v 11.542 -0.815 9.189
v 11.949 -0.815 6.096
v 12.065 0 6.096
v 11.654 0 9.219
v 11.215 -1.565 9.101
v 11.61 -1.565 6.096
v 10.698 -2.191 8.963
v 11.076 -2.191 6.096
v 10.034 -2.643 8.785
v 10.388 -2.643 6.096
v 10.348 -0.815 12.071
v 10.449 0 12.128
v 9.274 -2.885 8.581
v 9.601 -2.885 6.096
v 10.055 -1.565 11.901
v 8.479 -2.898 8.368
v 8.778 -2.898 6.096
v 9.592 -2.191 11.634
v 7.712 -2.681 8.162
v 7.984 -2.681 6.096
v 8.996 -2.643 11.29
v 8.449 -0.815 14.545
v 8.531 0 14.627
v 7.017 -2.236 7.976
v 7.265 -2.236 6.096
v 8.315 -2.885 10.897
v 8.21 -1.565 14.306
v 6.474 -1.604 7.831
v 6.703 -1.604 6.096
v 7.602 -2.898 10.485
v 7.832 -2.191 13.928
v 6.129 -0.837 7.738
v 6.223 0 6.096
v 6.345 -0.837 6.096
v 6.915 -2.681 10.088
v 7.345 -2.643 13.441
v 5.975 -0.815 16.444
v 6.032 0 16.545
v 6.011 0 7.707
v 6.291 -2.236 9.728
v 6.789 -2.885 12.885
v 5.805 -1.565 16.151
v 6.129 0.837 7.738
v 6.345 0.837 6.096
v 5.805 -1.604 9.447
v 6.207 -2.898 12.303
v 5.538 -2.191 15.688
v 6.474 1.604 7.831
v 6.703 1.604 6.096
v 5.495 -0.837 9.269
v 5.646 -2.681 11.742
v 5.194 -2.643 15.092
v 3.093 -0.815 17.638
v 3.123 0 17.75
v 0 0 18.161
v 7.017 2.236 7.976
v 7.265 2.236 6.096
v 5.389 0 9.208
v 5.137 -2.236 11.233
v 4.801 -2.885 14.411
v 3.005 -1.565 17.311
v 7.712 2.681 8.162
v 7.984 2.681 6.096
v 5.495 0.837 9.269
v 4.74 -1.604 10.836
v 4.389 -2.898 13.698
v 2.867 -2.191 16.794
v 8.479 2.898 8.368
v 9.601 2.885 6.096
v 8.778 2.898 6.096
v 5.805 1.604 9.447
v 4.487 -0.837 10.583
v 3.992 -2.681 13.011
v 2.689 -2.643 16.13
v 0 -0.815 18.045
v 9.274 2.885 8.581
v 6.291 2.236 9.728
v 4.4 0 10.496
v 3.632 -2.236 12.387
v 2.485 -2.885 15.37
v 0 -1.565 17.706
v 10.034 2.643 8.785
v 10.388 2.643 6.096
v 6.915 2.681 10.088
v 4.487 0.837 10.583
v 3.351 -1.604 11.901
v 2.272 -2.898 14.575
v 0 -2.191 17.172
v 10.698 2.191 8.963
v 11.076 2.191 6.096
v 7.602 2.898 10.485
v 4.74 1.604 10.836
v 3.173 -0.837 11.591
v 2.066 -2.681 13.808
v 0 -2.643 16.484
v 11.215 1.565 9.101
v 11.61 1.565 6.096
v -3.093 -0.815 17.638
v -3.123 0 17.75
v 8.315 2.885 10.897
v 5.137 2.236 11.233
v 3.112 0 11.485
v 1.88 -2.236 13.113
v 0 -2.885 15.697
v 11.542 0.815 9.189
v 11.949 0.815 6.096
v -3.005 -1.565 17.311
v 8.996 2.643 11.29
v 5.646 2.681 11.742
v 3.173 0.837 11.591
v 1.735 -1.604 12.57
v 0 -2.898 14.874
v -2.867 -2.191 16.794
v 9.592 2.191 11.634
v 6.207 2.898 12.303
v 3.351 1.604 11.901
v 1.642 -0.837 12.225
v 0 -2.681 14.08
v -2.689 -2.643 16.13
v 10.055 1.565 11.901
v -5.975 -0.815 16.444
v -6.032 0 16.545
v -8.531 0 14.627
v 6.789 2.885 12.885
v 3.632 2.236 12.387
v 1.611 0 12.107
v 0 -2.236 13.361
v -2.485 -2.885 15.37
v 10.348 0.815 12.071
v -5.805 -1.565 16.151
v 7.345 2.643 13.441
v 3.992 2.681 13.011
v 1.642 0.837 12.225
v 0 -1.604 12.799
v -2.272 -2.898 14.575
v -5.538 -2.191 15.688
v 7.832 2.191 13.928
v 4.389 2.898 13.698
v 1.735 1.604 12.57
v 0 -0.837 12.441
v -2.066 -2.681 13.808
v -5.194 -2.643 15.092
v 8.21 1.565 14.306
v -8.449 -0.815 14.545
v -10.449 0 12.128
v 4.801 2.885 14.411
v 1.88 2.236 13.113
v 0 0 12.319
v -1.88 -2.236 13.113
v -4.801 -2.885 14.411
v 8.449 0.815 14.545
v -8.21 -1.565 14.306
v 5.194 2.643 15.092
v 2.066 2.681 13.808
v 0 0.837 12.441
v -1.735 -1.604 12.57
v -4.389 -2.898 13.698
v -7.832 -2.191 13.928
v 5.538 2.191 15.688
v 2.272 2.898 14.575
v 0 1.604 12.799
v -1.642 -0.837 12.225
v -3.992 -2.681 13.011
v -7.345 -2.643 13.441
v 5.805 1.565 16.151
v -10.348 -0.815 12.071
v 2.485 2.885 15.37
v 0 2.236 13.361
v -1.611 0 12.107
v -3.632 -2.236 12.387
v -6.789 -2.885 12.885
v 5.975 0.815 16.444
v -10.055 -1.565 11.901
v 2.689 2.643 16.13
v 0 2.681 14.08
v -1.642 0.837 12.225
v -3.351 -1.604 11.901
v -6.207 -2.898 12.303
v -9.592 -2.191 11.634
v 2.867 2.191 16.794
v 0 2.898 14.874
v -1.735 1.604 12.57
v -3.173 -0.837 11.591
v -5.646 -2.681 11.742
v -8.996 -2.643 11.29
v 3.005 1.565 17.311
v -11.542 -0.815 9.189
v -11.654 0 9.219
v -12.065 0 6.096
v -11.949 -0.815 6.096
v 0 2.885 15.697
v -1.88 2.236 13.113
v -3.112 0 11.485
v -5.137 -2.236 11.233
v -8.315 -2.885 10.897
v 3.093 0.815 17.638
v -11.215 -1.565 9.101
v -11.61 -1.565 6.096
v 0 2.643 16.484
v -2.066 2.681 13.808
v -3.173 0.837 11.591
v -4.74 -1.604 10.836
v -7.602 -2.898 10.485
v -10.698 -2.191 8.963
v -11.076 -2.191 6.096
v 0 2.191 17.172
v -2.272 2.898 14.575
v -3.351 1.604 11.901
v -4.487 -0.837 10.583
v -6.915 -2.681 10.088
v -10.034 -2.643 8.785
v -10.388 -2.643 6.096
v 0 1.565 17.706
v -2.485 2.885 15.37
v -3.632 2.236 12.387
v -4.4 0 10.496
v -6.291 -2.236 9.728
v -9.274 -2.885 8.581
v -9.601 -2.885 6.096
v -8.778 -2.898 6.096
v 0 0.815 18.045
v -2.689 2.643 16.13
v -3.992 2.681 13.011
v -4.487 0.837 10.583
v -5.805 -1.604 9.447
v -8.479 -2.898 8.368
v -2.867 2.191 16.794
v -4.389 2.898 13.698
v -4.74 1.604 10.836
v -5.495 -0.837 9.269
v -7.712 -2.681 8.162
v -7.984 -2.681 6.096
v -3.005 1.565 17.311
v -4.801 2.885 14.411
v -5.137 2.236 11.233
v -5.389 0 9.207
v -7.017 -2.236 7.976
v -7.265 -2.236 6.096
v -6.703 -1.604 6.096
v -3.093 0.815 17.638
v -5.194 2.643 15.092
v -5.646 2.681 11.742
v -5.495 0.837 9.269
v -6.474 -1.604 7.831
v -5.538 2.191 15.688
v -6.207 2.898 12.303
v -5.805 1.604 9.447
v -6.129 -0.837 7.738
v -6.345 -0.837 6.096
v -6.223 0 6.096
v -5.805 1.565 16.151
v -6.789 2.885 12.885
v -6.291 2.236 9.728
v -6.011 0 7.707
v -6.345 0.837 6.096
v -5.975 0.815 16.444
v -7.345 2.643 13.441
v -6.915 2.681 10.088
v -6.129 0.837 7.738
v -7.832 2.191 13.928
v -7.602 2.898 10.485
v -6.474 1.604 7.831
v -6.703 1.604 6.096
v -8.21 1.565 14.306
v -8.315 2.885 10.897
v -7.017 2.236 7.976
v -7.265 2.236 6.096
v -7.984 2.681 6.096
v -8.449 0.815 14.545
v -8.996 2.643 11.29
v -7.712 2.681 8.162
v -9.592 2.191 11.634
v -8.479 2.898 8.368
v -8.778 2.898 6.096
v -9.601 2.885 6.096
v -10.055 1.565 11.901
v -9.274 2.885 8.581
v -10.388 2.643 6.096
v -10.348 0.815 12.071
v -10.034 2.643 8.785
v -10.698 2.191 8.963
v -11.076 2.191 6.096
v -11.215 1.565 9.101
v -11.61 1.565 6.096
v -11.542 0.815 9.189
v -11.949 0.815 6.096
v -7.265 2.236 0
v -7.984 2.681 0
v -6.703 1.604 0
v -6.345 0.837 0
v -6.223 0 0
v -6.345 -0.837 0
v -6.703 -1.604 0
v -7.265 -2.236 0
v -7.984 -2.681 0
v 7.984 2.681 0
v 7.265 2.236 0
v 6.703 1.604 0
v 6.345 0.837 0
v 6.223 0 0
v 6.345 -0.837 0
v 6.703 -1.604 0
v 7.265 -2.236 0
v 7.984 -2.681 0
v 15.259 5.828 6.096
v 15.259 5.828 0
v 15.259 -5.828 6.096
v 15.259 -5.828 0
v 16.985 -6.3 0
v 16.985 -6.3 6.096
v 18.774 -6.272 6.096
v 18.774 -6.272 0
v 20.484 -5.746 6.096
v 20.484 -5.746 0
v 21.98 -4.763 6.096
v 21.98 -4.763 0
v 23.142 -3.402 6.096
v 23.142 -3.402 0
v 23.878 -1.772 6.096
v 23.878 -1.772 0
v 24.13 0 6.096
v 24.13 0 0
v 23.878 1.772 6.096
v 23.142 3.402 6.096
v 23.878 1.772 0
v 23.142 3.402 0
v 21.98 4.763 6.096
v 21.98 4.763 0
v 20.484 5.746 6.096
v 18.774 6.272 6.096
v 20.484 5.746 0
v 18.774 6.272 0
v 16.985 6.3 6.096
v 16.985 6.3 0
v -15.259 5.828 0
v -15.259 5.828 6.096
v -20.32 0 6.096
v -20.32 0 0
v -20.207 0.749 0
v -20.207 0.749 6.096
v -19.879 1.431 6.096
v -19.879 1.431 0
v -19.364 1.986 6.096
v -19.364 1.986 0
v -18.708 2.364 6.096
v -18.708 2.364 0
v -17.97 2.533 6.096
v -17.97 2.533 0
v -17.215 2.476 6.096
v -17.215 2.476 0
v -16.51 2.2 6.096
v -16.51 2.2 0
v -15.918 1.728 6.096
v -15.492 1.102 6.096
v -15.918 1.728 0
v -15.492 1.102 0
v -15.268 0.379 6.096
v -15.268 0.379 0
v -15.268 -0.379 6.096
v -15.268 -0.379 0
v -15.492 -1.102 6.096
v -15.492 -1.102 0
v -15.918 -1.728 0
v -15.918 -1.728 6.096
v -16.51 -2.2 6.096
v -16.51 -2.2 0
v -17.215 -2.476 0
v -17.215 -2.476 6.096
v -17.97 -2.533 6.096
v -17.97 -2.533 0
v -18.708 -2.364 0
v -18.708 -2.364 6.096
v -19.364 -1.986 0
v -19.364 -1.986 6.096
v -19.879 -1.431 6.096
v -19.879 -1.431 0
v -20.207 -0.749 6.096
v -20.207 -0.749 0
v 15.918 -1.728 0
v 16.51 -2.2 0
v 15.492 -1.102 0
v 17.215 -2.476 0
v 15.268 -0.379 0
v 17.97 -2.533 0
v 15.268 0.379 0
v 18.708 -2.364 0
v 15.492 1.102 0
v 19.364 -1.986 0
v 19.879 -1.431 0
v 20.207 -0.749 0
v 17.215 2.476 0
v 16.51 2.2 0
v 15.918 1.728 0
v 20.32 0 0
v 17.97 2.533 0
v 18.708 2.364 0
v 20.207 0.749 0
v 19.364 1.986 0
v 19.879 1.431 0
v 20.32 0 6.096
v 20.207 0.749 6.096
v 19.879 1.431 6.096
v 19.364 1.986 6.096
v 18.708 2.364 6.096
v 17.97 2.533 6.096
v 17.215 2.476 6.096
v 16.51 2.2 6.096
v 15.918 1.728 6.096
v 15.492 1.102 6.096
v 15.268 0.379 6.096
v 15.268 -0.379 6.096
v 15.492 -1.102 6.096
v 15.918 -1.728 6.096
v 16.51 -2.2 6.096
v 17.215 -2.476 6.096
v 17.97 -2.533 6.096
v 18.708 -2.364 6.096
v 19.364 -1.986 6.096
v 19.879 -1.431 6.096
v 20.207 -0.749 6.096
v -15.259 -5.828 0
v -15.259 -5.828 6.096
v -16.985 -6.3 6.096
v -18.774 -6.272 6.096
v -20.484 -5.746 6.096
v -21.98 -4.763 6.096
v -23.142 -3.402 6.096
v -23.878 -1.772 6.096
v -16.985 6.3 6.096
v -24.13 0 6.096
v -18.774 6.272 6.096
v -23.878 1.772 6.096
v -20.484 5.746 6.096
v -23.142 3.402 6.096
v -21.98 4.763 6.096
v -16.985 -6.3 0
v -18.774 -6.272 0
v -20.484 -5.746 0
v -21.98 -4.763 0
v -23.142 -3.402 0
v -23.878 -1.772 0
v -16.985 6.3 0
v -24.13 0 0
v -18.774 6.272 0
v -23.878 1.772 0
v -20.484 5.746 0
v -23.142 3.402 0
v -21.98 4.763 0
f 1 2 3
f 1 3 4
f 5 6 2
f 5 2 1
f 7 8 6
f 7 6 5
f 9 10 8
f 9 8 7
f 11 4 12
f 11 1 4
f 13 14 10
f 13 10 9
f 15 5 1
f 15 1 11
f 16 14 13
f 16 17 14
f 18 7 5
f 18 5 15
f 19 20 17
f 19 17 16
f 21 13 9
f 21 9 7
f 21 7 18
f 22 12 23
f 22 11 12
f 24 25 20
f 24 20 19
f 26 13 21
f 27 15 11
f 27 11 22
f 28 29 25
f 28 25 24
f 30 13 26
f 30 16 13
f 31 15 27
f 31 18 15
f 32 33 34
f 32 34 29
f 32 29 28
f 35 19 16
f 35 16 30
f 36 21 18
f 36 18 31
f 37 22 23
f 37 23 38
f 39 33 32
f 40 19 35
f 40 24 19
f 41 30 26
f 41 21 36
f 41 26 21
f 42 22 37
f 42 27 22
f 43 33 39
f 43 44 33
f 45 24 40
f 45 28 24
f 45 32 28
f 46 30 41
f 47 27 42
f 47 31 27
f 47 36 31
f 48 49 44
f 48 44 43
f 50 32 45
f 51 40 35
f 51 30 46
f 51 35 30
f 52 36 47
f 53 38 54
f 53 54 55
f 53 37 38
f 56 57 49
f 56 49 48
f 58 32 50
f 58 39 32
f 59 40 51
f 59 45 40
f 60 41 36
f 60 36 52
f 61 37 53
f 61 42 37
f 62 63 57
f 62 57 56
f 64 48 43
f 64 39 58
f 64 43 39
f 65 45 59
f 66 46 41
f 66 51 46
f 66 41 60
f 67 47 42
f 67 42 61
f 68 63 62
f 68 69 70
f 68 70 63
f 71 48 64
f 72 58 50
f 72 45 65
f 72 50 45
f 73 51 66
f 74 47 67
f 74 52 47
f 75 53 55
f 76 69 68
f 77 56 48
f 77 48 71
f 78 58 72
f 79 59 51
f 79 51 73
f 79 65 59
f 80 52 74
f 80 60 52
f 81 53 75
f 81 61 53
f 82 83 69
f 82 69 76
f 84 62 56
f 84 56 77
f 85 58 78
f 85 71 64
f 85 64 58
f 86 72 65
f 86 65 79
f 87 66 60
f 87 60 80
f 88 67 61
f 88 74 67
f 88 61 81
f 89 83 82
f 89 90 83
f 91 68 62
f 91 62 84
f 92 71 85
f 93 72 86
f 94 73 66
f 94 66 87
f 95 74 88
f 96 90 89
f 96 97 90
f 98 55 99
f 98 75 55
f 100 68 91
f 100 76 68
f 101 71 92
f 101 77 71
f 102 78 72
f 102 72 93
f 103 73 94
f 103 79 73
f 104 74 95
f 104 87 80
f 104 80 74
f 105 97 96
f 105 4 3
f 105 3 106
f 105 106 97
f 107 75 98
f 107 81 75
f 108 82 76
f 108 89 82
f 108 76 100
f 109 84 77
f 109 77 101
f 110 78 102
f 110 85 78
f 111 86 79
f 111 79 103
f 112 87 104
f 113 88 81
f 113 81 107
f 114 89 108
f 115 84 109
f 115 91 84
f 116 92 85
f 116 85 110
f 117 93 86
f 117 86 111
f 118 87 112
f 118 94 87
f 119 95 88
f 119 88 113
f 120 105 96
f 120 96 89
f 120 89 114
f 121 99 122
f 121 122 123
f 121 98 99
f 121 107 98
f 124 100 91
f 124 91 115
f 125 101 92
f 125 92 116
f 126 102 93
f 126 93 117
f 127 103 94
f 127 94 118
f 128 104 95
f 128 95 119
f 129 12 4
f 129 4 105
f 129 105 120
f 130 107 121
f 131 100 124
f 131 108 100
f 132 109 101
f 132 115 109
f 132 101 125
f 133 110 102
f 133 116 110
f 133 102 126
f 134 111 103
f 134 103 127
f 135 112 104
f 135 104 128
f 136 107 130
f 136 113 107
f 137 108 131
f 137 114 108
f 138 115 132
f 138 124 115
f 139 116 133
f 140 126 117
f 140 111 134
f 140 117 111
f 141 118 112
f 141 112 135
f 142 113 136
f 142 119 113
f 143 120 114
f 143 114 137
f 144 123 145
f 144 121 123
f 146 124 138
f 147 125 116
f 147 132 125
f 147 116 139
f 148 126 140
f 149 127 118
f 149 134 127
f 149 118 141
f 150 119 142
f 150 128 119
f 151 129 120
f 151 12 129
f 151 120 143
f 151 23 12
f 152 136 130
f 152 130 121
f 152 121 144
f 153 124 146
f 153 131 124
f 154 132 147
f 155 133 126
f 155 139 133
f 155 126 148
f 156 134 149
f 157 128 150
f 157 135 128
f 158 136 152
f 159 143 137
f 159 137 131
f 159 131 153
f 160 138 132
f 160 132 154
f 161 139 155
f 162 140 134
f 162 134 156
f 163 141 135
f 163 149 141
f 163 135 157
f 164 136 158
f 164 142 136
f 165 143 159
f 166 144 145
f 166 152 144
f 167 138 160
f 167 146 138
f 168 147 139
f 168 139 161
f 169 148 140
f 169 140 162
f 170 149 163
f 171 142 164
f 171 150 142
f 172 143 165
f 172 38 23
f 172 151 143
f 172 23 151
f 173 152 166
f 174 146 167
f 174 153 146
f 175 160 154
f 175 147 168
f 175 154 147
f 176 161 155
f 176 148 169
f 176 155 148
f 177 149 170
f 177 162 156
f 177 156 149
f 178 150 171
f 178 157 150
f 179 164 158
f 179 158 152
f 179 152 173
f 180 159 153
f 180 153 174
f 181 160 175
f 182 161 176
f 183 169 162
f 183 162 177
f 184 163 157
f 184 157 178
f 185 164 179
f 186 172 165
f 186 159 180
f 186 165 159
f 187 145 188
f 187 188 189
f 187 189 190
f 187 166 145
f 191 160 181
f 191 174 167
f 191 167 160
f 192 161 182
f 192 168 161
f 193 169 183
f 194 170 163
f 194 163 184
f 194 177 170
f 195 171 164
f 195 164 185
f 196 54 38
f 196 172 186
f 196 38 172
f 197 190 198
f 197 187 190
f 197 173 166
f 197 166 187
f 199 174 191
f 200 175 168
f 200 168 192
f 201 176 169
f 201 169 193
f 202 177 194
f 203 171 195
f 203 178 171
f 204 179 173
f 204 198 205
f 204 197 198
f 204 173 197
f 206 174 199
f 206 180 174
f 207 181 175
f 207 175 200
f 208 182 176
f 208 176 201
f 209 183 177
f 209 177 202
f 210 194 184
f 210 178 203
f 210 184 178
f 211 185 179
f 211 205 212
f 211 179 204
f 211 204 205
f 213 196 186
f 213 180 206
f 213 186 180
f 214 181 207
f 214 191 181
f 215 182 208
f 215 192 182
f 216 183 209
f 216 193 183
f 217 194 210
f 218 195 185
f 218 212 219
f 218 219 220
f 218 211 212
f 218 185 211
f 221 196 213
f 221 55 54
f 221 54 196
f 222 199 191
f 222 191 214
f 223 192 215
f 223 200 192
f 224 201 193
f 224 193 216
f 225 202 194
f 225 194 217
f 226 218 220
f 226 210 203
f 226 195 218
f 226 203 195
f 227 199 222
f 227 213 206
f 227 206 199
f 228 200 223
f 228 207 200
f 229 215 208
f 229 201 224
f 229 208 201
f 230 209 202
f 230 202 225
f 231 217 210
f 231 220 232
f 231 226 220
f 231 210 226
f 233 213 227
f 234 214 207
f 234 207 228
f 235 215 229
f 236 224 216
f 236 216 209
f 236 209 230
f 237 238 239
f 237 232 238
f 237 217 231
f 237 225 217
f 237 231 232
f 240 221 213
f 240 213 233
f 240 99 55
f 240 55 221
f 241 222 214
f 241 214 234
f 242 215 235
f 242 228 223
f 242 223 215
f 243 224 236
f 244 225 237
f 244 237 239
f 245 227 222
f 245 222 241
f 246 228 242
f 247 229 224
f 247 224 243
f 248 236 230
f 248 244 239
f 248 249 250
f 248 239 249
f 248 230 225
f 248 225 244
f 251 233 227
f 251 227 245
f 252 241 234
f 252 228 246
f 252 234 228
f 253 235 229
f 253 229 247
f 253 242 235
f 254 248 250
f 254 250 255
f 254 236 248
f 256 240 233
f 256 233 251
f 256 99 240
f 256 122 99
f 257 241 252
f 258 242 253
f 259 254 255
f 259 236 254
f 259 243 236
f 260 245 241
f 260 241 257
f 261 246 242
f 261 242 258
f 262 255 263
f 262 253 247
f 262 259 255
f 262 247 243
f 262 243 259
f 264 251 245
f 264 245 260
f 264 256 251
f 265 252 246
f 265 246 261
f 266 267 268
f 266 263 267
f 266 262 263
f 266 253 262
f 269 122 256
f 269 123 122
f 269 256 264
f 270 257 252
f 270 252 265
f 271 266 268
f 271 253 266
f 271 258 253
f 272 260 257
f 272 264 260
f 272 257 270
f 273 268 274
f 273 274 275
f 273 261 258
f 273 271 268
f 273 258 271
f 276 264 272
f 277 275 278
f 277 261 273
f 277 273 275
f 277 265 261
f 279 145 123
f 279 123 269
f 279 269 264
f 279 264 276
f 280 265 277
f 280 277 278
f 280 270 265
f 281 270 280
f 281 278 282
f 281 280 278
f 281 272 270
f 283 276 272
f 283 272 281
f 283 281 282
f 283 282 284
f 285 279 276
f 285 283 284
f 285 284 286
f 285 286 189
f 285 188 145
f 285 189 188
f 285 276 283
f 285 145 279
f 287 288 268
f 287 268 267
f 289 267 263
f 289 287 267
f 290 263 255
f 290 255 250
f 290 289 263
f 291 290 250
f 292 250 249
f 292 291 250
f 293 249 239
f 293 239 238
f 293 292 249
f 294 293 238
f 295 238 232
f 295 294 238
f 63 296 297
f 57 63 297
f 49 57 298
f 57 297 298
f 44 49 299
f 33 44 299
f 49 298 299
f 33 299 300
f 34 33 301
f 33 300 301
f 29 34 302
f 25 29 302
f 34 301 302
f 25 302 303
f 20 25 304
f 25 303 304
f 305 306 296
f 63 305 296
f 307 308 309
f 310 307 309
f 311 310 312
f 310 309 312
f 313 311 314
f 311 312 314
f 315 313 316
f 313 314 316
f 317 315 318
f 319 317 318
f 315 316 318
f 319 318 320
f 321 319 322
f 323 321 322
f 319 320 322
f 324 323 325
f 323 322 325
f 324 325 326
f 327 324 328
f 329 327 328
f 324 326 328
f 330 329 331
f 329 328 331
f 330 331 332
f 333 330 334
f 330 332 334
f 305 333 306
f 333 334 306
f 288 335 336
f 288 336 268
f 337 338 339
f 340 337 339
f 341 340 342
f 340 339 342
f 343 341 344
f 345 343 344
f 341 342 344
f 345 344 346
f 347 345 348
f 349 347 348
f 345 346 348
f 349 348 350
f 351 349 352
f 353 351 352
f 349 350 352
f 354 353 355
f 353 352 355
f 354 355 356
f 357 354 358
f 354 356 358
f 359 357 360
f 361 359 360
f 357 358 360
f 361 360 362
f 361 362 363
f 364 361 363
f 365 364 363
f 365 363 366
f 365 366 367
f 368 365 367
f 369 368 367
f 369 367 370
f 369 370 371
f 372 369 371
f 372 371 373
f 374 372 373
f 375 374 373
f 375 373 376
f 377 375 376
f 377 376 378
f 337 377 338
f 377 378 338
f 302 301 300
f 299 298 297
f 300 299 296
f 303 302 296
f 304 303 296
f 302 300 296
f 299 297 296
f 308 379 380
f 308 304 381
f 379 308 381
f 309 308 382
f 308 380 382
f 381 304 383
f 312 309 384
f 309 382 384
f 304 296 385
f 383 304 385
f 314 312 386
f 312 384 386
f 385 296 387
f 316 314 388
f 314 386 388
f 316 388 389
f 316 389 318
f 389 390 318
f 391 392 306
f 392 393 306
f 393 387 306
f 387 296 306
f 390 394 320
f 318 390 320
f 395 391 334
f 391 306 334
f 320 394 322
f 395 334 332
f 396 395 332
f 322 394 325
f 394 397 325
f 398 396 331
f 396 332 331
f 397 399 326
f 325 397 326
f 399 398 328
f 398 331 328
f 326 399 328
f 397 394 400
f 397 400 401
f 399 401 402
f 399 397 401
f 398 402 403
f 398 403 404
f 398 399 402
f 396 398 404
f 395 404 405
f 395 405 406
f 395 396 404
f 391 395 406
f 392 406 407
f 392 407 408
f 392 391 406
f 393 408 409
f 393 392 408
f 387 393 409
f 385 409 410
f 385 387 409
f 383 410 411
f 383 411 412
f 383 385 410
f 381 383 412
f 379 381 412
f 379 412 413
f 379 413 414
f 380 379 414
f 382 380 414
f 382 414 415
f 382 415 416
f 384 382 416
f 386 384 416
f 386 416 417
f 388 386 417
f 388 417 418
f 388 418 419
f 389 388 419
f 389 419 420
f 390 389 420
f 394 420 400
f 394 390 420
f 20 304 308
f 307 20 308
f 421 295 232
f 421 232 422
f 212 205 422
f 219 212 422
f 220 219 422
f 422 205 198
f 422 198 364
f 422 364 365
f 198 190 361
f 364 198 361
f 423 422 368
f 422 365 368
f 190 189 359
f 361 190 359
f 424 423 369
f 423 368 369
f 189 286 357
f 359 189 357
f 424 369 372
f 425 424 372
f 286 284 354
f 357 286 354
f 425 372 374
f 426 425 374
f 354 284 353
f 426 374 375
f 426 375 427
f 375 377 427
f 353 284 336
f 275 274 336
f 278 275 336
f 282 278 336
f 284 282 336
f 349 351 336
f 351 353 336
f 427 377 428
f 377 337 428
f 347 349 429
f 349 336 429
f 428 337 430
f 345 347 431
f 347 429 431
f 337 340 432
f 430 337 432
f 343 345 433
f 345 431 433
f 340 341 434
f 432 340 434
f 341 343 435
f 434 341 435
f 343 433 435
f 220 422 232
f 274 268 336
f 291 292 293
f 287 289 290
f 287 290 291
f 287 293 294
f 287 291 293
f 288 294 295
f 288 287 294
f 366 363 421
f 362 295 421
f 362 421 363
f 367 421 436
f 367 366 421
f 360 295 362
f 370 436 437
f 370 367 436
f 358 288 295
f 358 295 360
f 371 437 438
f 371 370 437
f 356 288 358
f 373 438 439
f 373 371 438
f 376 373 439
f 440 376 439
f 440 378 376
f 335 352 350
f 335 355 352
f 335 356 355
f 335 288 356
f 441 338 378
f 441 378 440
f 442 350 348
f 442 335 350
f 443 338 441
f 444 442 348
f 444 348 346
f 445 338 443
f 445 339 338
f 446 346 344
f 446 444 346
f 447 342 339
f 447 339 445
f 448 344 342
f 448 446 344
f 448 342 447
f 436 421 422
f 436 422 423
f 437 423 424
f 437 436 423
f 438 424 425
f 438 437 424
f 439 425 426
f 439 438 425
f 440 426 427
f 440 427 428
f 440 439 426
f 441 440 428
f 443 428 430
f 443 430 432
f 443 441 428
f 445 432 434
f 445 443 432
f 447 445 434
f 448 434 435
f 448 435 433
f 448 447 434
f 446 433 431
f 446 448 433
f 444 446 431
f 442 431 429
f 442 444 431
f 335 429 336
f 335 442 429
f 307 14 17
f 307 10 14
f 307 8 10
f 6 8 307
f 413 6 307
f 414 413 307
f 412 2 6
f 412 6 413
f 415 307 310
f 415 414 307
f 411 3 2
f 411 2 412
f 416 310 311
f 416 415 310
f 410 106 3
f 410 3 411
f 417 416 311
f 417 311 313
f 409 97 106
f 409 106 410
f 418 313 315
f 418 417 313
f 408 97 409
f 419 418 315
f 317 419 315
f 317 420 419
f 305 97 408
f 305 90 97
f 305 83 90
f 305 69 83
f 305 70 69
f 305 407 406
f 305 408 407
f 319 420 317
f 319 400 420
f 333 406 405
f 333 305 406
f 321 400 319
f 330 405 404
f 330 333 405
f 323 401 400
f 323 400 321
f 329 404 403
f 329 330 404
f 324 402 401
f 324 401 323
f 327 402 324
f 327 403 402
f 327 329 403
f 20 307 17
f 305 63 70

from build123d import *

# Parameters (mm, degrees)
F0_R      = 2.921
F3_R      = 2.921
F4_FACE_R = 2.921
F8_R      = 2.54
F9_DEPTH  = 6.096


with BuildPart() as f4:
    # F0 (on Top) → F4 section 0
    with BuildSketch(Plane.XY):
        with Locations((9.144, 0)):
            Circle(F0_R)
    # F3 (on offset) → F4 section 1
    with BuildSketch(Plane.XY.offset(6.096)):
        with Locations((9.144, 0)):
            Circle(F3_R)
    loft()

    # F6: sweep along a path in F5
    with BuildLine(Plane.XZ) as f6_path:
        ThreePointArc((9.144, 6.096), (0, 15.24), (-9.144, 6.096))
    # F4_face (on face) → F6 (sweep)
    with BuildSketch(Plane(origin=(9.144, 0, 6.096), x_dir=(1, 0, 0), z_dir=(0, 0, 1))):
        Circle(F4_FACE_R)
    sweep(path=f6_path.line)

    # F7: F4 across plane


with BuildPart() as f4_1:
    add(f4.part)
    add(f4.part.mirror(Plane.YZ))

    # F8 (on Top) → F9 (join)
    with BuildSketch(Plane.XY):
        with BuildLine():
            Line((7.9841911765, -2.6808738301), (15.2586764706, -5.8279865872))
            ThreePointArc((15.2586764706, -5.8279865872), (24.13, 0), (15.2586764706, 5.8279865872))
            Line((15.2586764706, 5.8279865872), (7.9841911765, 2.6808738301))
            ThreePointArc((7.9841911765, 2.6808738301), (6.223, 0), (7.9841911765, -2.6808738301))
        make_face()
        with Locations((17.78, 0)):
            Circle(F8_R, mode=Mode.SUBTRACT)
    extrude(amount=F9_DEPTH)

    # F10: F4 across plane


with BuildPart() as f4_2:
    add(f4_1.part)
    add(f4_1.part.mirror(Plane.YZ))


solid = f4_2.part
